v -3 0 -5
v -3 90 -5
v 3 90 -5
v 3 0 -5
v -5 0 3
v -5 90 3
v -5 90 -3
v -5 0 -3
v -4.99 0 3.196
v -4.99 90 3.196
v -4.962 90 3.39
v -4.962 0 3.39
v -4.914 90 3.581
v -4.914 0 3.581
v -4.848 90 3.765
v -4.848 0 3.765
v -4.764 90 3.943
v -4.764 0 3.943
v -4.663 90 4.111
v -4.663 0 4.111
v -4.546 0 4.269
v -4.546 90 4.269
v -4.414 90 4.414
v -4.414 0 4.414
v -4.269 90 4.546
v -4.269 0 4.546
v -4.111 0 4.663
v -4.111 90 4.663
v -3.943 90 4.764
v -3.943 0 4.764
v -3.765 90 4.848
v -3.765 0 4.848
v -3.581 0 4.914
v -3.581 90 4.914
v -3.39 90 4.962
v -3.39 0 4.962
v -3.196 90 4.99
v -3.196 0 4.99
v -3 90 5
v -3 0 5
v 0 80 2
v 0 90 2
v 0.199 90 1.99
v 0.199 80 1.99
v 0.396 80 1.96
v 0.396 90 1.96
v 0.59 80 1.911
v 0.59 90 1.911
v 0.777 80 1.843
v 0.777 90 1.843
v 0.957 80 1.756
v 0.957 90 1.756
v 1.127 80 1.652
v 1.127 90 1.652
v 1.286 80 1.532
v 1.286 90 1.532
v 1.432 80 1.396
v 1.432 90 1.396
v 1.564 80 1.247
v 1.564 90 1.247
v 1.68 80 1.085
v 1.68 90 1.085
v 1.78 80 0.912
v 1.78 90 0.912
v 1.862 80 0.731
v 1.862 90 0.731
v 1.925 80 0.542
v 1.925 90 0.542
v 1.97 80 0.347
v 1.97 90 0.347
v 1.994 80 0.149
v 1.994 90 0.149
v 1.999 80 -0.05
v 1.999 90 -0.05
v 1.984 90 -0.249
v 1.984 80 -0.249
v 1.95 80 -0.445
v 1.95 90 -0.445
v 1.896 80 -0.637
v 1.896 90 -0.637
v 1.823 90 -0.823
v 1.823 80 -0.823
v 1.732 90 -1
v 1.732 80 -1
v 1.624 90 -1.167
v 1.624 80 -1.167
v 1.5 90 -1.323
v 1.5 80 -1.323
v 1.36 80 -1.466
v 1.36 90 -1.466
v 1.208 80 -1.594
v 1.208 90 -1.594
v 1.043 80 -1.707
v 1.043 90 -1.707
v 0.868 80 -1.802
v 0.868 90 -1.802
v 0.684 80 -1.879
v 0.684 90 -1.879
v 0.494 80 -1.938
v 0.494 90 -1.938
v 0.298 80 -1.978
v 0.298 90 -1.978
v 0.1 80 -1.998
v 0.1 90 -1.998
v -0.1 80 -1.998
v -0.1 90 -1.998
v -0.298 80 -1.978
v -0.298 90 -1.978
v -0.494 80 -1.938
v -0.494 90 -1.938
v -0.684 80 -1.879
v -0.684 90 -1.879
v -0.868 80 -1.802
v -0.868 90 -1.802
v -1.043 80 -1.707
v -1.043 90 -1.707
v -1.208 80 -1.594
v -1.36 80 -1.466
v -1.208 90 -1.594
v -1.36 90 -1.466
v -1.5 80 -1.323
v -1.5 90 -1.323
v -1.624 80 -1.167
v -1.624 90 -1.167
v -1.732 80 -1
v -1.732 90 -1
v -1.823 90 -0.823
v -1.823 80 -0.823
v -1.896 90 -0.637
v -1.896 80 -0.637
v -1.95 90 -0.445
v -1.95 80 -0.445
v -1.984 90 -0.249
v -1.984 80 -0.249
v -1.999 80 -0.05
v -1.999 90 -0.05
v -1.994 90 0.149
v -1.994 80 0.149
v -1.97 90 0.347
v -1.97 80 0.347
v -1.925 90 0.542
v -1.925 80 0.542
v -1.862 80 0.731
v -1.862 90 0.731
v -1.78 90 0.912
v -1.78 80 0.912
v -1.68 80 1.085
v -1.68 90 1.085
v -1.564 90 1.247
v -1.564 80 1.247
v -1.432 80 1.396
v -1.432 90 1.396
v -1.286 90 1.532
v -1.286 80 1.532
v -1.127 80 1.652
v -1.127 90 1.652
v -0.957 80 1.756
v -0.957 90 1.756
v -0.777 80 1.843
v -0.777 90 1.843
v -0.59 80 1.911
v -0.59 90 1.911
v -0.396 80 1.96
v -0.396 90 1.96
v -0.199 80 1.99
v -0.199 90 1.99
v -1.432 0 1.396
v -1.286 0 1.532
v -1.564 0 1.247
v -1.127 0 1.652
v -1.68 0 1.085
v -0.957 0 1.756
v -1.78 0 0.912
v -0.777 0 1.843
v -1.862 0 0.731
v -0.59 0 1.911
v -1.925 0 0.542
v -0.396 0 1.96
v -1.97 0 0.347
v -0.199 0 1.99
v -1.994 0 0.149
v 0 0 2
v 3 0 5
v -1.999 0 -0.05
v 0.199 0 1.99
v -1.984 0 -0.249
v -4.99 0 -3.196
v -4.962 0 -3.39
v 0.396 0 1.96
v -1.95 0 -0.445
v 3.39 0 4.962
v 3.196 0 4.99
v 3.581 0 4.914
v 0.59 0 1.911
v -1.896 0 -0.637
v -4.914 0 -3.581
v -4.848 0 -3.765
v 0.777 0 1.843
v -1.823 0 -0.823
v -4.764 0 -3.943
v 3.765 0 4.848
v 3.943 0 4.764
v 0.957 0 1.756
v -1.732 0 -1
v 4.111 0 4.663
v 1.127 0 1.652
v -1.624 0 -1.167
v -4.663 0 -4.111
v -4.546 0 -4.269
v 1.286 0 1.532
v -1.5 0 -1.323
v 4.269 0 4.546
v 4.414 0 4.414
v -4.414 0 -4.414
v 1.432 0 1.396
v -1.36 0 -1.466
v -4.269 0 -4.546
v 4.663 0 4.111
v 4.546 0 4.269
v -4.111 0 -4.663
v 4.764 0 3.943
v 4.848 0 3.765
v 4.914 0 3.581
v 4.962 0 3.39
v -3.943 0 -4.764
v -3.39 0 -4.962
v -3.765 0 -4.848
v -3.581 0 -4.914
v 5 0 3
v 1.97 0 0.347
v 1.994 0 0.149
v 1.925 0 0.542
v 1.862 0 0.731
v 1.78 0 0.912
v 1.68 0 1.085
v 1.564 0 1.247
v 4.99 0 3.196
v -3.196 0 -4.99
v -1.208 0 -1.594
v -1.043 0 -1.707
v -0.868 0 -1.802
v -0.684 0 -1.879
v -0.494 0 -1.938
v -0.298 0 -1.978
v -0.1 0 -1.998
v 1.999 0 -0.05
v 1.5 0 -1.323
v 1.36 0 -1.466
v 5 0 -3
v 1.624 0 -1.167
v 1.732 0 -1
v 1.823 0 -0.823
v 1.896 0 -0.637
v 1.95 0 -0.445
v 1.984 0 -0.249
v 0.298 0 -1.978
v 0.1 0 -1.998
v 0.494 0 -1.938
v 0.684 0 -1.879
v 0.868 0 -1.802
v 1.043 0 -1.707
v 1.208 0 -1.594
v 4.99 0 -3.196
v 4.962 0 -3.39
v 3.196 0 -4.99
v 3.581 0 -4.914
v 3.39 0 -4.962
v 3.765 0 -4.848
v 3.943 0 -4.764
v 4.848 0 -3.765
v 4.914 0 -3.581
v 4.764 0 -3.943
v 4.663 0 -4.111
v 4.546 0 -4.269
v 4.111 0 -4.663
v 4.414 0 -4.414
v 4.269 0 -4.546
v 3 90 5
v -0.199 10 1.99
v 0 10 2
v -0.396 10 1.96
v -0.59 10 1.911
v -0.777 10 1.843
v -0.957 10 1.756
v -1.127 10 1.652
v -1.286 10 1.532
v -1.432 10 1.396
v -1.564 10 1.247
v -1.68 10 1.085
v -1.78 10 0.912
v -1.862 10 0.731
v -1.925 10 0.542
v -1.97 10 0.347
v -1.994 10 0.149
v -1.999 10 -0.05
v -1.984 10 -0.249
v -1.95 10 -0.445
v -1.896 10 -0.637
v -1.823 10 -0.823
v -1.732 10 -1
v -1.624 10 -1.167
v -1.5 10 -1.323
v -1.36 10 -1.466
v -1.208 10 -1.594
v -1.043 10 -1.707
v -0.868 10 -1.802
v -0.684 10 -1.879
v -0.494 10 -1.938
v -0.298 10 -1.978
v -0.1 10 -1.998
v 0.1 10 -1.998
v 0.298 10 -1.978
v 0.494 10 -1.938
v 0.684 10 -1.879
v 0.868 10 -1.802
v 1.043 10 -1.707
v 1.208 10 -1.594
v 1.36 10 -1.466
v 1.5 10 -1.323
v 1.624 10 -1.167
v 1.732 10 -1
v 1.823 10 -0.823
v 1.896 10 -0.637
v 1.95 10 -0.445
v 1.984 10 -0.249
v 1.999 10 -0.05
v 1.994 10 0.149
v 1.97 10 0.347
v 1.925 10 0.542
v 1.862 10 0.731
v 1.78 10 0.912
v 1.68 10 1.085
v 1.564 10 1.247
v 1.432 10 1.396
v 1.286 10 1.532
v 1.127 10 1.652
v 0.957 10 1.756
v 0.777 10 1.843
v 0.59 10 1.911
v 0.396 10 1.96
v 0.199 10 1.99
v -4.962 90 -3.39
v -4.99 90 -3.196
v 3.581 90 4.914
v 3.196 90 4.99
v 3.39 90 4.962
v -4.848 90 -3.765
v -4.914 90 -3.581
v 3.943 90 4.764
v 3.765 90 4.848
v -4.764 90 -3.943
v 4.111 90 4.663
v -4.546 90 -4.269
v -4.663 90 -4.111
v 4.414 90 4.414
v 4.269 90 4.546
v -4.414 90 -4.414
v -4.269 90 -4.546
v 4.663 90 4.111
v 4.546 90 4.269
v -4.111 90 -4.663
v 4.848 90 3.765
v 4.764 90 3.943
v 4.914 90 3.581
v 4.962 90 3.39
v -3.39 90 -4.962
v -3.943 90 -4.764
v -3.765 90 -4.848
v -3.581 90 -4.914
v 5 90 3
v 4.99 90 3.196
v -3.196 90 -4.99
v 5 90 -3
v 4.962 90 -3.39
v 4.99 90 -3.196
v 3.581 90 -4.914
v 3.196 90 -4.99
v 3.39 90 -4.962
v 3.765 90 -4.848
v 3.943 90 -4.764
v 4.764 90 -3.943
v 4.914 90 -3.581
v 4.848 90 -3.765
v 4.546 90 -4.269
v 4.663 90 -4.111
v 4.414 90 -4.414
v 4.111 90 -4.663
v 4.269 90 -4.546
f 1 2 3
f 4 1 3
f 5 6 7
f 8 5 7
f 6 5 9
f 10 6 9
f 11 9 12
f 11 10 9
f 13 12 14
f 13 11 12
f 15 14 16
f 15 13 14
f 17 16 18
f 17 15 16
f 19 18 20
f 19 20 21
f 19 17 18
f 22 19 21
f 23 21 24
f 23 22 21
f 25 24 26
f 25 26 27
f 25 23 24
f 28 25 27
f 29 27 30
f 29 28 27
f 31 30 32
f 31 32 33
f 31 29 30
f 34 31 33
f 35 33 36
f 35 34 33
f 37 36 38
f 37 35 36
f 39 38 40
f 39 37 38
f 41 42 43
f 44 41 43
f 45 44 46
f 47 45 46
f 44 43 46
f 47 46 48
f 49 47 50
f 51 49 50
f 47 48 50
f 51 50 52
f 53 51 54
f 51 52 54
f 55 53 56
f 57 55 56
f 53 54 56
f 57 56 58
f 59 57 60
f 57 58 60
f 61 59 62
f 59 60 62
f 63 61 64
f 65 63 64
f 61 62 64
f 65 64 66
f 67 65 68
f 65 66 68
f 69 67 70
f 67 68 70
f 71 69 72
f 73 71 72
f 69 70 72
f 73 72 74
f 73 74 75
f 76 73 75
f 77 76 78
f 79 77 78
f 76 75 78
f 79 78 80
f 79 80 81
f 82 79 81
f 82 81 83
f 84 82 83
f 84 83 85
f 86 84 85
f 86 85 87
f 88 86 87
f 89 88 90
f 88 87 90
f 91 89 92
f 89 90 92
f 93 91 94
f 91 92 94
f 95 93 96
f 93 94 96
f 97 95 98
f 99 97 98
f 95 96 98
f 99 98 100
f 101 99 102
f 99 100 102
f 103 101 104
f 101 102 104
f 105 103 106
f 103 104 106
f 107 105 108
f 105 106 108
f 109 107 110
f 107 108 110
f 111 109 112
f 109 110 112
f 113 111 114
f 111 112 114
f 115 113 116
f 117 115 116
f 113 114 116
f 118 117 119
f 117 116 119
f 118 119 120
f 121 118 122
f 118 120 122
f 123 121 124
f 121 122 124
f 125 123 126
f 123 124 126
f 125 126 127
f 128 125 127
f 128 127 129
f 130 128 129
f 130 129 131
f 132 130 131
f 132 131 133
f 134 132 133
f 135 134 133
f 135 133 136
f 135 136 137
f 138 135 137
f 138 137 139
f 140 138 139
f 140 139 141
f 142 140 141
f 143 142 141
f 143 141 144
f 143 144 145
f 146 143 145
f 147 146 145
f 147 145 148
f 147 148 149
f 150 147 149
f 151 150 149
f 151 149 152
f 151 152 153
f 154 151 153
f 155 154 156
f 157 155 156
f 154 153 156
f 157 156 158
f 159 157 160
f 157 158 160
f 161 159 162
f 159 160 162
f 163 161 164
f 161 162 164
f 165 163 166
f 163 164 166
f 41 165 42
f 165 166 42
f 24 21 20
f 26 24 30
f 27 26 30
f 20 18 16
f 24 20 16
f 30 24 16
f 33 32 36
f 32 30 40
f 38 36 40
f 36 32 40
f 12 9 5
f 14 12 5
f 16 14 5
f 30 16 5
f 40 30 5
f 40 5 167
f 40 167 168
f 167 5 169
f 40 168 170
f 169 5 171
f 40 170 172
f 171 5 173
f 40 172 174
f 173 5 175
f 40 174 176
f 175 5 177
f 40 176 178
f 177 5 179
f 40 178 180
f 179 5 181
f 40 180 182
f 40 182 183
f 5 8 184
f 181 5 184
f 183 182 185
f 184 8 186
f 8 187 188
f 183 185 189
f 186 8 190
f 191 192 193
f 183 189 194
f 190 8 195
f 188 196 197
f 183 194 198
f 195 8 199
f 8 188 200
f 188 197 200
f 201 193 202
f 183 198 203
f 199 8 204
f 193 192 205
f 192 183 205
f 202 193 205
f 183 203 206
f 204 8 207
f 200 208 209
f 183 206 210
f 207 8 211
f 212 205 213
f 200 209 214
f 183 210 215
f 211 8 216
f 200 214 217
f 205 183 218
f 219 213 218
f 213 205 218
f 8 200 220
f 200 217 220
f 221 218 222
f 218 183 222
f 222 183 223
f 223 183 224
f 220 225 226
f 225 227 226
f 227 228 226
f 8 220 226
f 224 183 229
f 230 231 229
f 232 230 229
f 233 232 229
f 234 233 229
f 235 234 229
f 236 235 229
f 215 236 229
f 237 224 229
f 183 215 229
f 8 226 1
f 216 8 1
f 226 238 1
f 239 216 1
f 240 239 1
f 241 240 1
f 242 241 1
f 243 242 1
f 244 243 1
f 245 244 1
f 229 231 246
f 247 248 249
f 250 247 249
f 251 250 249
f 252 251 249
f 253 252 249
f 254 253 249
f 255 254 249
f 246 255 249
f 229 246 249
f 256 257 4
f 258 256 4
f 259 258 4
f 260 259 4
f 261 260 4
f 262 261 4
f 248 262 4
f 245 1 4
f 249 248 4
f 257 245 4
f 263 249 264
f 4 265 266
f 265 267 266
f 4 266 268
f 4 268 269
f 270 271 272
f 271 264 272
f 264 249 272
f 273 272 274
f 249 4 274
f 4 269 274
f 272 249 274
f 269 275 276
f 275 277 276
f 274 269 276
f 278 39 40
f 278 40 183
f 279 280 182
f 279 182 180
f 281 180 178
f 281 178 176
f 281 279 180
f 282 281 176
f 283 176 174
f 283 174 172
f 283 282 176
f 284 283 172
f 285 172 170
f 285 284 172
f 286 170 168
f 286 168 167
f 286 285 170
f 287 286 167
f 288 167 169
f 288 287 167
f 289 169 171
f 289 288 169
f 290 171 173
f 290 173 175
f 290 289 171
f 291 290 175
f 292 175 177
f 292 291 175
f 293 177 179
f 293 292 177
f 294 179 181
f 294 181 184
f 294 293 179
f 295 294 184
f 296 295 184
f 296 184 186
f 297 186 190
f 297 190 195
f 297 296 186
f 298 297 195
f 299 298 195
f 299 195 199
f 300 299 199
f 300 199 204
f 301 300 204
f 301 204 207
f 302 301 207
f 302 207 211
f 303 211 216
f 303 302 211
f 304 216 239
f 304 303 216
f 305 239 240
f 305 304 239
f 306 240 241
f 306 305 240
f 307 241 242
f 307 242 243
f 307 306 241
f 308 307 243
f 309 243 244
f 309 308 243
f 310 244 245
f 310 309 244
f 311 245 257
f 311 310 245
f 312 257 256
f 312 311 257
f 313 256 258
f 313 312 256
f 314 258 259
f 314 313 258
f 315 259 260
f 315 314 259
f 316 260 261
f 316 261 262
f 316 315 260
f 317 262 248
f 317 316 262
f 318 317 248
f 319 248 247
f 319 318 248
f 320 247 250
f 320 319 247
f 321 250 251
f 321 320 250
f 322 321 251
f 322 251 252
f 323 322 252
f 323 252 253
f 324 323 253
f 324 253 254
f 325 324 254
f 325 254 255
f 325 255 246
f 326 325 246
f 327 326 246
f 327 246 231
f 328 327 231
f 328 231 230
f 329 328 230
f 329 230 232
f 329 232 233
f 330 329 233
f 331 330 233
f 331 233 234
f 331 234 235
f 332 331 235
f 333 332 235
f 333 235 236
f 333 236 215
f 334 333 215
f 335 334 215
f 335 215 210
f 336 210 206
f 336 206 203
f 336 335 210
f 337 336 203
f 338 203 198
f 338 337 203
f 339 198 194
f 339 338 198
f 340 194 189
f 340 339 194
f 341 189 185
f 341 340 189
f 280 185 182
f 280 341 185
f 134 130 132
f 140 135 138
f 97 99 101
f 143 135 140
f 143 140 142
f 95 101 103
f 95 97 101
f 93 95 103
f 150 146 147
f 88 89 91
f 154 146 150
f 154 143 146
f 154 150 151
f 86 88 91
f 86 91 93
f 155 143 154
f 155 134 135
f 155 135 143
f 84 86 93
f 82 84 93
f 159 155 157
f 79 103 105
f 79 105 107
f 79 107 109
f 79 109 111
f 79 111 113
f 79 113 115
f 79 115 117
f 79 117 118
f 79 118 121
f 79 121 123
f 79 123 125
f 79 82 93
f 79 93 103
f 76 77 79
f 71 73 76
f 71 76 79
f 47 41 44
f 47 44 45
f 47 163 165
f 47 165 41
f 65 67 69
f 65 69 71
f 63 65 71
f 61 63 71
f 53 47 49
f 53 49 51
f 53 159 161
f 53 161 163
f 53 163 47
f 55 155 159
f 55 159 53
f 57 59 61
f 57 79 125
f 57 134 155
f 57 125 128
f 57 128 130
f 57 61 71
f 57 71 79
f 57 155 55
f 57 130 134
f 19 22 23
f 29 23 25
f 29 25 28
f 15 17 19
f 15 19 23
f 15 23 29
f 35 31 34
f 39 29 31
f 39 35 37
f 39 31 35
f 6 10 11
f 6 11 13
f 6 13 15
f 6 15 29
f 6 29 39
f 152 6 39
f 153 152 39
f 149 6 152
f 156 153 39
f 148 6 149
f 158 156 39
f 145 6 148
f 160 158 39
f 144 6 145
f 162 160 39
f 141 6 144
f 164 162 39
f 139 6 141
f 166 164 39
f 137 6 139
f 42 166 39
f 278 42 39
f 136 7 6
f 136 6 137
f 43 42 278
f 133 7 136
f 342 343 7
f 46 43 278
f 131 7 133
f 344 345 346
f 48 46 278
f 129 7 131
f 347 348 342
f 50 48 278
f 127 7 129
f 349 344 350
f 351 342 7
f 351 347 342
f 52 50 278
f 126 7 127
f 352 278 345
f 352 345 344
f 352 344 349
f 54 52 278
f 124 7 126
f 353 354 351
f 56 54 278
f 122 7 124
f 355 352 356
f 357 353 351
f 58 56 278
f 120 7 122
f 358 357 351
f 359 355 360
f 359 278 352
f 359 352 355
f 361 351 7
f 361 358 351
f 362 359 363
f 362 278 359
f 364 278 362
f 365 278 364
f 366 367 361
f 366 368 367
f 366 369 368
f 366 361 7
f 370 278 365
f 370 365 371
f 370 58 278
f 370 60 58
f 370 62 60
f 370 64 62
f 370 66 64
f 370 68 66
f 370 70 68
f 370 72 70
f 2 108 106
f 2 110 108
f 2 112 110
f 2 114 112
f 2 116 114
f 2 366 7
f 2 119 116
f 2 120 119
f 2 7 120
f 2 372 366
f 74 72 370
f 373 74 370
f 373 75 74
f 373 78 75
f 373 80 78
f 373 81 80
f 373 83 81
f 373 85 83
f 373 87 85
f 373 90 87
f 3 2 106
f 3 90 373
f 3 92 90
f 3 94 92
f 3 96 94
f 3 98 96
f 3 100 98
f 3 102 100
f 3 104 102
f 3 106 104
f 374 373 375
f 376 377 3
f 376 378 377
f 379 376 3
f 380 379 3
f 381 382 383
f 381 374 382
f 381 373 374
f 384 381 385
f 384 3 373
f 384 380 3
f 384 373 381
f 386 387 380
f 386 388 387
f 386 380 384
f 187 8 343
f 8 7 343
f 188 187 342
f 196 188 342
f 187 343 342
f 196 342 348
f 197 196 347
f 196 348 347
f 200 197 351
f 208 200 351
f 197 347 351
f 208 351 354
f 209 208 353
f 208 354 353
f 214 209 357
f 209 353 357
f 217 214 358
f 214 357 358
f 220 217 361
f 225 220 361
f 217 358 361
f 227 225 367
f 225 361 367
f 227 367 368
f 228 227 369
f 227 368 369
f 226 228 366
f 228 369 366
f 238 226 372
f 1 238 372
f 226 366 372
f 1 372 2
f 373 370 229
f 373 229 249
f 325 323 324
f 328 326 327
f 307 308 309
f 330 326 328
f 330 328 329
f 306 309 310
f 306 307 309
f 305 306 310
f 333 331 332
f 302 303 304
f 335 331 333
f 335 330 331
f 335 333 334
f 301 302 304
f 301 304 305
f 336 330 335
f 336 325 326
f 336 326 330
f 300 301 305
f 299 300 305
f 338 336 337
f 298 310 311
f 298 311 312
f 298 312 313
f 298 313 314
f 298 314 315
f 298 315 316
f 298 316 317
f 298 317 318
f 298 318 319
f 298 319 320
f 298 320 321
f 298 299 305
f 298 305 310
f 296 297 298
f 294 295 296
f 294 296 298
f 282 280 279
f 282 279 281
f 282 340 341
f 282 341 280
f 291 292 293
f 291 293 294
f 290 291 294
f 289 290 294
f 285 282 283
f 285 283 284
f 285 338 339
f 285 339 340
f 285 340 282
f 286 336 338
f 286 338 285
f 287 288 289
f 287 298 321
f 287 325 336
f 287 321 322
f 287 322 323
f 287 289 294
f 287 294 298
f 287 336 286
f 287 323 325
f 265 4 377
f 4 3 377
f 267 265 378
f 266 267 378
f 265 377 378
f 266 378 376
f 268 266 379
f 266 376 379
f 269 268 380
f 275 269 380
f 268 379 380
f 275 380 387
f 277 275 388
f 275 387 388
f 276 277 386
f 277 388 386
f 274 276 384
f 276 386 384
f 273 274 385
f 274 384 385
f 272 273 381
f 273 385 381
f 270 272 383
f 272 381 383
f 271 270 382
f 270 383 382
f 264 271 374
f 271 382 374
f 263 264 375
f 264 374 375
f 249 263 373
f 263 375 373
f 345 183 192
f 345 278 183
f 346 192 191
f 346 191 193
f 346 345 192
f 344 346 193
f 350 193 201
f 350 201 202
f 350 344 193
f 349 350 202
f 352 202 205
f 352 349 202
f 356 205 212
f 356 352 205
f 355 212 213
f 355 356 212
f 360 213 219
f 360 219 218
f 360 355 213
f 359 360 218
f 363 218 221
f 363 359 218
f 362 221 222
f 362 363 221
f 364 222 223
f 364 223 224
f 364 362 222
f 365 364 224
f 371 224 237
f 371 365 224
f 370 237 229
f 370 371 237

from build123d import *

# Parameters (mm, degrees)
SKETCH_1_W          = 10
SKETCH_1_H          = 10
EXTRUDE_1_DEPTH     = 90
SKETCH_2_R          = 2
CUT_EXTRUDE_1_DEPTH = 10
CUT_EXTRUDE_START   = -10
SKETCH_4_R          = 2
CUT_EXTRUDE_2_DEPTH = 10
FILLET_1_R          = 2


with BuildPart() as part:
    # 草图1 → 凸台-拉伸1 (new body)
    with BuildSketch(Plane(origin=(0, 0, 0), x_dir=(1, 0, 0), z_dir=(0, 1, 0))):
        Rectangle(SKETCH_1_W, SKETCH_1_H)
    extrude(amount=EXTRUDE_1_DEPTH)

    # 草图2 → 切除-拉伸1 (cut)
    with BuildSketch(Plane(origin=(0, 90, 0), x_dir=(1, 0, 0), z_dir=(0, 1, 0))):
        with Locations(Location((0, 0, 0), (0, 0, 270))):
            Circle(SKETCH_2_R)
    extrude(amount=-CUT_EXTRUDE_1_DEPTH, mode=Mode.SUBTRACT)

    # 草图4 → 切除-拉伸2 (cut)
    with BuildSketch(Plane.XZ.offset(CUT_EXTRUDE_START)):
        with Locations(Location((0, 0, 0), (0, 0, 90))):
            Circle(SKETCH_4_R)
    extrude(amount=CUT_EXTRUDE_2_DEPTH, mode=Mode.SUBTRACT)

    # 圆角1
    fillet_1_edges = [part.edges().sort_by_distance(p)[0] for p in [
        (-5, 45, -5),
        (5, 45, -5),
        (5, 45, 5),
        (-5, 45, 5),
    ]]
    fillet(fillet_1_edges, radius=FILLET_1_R)


solid = part.part
